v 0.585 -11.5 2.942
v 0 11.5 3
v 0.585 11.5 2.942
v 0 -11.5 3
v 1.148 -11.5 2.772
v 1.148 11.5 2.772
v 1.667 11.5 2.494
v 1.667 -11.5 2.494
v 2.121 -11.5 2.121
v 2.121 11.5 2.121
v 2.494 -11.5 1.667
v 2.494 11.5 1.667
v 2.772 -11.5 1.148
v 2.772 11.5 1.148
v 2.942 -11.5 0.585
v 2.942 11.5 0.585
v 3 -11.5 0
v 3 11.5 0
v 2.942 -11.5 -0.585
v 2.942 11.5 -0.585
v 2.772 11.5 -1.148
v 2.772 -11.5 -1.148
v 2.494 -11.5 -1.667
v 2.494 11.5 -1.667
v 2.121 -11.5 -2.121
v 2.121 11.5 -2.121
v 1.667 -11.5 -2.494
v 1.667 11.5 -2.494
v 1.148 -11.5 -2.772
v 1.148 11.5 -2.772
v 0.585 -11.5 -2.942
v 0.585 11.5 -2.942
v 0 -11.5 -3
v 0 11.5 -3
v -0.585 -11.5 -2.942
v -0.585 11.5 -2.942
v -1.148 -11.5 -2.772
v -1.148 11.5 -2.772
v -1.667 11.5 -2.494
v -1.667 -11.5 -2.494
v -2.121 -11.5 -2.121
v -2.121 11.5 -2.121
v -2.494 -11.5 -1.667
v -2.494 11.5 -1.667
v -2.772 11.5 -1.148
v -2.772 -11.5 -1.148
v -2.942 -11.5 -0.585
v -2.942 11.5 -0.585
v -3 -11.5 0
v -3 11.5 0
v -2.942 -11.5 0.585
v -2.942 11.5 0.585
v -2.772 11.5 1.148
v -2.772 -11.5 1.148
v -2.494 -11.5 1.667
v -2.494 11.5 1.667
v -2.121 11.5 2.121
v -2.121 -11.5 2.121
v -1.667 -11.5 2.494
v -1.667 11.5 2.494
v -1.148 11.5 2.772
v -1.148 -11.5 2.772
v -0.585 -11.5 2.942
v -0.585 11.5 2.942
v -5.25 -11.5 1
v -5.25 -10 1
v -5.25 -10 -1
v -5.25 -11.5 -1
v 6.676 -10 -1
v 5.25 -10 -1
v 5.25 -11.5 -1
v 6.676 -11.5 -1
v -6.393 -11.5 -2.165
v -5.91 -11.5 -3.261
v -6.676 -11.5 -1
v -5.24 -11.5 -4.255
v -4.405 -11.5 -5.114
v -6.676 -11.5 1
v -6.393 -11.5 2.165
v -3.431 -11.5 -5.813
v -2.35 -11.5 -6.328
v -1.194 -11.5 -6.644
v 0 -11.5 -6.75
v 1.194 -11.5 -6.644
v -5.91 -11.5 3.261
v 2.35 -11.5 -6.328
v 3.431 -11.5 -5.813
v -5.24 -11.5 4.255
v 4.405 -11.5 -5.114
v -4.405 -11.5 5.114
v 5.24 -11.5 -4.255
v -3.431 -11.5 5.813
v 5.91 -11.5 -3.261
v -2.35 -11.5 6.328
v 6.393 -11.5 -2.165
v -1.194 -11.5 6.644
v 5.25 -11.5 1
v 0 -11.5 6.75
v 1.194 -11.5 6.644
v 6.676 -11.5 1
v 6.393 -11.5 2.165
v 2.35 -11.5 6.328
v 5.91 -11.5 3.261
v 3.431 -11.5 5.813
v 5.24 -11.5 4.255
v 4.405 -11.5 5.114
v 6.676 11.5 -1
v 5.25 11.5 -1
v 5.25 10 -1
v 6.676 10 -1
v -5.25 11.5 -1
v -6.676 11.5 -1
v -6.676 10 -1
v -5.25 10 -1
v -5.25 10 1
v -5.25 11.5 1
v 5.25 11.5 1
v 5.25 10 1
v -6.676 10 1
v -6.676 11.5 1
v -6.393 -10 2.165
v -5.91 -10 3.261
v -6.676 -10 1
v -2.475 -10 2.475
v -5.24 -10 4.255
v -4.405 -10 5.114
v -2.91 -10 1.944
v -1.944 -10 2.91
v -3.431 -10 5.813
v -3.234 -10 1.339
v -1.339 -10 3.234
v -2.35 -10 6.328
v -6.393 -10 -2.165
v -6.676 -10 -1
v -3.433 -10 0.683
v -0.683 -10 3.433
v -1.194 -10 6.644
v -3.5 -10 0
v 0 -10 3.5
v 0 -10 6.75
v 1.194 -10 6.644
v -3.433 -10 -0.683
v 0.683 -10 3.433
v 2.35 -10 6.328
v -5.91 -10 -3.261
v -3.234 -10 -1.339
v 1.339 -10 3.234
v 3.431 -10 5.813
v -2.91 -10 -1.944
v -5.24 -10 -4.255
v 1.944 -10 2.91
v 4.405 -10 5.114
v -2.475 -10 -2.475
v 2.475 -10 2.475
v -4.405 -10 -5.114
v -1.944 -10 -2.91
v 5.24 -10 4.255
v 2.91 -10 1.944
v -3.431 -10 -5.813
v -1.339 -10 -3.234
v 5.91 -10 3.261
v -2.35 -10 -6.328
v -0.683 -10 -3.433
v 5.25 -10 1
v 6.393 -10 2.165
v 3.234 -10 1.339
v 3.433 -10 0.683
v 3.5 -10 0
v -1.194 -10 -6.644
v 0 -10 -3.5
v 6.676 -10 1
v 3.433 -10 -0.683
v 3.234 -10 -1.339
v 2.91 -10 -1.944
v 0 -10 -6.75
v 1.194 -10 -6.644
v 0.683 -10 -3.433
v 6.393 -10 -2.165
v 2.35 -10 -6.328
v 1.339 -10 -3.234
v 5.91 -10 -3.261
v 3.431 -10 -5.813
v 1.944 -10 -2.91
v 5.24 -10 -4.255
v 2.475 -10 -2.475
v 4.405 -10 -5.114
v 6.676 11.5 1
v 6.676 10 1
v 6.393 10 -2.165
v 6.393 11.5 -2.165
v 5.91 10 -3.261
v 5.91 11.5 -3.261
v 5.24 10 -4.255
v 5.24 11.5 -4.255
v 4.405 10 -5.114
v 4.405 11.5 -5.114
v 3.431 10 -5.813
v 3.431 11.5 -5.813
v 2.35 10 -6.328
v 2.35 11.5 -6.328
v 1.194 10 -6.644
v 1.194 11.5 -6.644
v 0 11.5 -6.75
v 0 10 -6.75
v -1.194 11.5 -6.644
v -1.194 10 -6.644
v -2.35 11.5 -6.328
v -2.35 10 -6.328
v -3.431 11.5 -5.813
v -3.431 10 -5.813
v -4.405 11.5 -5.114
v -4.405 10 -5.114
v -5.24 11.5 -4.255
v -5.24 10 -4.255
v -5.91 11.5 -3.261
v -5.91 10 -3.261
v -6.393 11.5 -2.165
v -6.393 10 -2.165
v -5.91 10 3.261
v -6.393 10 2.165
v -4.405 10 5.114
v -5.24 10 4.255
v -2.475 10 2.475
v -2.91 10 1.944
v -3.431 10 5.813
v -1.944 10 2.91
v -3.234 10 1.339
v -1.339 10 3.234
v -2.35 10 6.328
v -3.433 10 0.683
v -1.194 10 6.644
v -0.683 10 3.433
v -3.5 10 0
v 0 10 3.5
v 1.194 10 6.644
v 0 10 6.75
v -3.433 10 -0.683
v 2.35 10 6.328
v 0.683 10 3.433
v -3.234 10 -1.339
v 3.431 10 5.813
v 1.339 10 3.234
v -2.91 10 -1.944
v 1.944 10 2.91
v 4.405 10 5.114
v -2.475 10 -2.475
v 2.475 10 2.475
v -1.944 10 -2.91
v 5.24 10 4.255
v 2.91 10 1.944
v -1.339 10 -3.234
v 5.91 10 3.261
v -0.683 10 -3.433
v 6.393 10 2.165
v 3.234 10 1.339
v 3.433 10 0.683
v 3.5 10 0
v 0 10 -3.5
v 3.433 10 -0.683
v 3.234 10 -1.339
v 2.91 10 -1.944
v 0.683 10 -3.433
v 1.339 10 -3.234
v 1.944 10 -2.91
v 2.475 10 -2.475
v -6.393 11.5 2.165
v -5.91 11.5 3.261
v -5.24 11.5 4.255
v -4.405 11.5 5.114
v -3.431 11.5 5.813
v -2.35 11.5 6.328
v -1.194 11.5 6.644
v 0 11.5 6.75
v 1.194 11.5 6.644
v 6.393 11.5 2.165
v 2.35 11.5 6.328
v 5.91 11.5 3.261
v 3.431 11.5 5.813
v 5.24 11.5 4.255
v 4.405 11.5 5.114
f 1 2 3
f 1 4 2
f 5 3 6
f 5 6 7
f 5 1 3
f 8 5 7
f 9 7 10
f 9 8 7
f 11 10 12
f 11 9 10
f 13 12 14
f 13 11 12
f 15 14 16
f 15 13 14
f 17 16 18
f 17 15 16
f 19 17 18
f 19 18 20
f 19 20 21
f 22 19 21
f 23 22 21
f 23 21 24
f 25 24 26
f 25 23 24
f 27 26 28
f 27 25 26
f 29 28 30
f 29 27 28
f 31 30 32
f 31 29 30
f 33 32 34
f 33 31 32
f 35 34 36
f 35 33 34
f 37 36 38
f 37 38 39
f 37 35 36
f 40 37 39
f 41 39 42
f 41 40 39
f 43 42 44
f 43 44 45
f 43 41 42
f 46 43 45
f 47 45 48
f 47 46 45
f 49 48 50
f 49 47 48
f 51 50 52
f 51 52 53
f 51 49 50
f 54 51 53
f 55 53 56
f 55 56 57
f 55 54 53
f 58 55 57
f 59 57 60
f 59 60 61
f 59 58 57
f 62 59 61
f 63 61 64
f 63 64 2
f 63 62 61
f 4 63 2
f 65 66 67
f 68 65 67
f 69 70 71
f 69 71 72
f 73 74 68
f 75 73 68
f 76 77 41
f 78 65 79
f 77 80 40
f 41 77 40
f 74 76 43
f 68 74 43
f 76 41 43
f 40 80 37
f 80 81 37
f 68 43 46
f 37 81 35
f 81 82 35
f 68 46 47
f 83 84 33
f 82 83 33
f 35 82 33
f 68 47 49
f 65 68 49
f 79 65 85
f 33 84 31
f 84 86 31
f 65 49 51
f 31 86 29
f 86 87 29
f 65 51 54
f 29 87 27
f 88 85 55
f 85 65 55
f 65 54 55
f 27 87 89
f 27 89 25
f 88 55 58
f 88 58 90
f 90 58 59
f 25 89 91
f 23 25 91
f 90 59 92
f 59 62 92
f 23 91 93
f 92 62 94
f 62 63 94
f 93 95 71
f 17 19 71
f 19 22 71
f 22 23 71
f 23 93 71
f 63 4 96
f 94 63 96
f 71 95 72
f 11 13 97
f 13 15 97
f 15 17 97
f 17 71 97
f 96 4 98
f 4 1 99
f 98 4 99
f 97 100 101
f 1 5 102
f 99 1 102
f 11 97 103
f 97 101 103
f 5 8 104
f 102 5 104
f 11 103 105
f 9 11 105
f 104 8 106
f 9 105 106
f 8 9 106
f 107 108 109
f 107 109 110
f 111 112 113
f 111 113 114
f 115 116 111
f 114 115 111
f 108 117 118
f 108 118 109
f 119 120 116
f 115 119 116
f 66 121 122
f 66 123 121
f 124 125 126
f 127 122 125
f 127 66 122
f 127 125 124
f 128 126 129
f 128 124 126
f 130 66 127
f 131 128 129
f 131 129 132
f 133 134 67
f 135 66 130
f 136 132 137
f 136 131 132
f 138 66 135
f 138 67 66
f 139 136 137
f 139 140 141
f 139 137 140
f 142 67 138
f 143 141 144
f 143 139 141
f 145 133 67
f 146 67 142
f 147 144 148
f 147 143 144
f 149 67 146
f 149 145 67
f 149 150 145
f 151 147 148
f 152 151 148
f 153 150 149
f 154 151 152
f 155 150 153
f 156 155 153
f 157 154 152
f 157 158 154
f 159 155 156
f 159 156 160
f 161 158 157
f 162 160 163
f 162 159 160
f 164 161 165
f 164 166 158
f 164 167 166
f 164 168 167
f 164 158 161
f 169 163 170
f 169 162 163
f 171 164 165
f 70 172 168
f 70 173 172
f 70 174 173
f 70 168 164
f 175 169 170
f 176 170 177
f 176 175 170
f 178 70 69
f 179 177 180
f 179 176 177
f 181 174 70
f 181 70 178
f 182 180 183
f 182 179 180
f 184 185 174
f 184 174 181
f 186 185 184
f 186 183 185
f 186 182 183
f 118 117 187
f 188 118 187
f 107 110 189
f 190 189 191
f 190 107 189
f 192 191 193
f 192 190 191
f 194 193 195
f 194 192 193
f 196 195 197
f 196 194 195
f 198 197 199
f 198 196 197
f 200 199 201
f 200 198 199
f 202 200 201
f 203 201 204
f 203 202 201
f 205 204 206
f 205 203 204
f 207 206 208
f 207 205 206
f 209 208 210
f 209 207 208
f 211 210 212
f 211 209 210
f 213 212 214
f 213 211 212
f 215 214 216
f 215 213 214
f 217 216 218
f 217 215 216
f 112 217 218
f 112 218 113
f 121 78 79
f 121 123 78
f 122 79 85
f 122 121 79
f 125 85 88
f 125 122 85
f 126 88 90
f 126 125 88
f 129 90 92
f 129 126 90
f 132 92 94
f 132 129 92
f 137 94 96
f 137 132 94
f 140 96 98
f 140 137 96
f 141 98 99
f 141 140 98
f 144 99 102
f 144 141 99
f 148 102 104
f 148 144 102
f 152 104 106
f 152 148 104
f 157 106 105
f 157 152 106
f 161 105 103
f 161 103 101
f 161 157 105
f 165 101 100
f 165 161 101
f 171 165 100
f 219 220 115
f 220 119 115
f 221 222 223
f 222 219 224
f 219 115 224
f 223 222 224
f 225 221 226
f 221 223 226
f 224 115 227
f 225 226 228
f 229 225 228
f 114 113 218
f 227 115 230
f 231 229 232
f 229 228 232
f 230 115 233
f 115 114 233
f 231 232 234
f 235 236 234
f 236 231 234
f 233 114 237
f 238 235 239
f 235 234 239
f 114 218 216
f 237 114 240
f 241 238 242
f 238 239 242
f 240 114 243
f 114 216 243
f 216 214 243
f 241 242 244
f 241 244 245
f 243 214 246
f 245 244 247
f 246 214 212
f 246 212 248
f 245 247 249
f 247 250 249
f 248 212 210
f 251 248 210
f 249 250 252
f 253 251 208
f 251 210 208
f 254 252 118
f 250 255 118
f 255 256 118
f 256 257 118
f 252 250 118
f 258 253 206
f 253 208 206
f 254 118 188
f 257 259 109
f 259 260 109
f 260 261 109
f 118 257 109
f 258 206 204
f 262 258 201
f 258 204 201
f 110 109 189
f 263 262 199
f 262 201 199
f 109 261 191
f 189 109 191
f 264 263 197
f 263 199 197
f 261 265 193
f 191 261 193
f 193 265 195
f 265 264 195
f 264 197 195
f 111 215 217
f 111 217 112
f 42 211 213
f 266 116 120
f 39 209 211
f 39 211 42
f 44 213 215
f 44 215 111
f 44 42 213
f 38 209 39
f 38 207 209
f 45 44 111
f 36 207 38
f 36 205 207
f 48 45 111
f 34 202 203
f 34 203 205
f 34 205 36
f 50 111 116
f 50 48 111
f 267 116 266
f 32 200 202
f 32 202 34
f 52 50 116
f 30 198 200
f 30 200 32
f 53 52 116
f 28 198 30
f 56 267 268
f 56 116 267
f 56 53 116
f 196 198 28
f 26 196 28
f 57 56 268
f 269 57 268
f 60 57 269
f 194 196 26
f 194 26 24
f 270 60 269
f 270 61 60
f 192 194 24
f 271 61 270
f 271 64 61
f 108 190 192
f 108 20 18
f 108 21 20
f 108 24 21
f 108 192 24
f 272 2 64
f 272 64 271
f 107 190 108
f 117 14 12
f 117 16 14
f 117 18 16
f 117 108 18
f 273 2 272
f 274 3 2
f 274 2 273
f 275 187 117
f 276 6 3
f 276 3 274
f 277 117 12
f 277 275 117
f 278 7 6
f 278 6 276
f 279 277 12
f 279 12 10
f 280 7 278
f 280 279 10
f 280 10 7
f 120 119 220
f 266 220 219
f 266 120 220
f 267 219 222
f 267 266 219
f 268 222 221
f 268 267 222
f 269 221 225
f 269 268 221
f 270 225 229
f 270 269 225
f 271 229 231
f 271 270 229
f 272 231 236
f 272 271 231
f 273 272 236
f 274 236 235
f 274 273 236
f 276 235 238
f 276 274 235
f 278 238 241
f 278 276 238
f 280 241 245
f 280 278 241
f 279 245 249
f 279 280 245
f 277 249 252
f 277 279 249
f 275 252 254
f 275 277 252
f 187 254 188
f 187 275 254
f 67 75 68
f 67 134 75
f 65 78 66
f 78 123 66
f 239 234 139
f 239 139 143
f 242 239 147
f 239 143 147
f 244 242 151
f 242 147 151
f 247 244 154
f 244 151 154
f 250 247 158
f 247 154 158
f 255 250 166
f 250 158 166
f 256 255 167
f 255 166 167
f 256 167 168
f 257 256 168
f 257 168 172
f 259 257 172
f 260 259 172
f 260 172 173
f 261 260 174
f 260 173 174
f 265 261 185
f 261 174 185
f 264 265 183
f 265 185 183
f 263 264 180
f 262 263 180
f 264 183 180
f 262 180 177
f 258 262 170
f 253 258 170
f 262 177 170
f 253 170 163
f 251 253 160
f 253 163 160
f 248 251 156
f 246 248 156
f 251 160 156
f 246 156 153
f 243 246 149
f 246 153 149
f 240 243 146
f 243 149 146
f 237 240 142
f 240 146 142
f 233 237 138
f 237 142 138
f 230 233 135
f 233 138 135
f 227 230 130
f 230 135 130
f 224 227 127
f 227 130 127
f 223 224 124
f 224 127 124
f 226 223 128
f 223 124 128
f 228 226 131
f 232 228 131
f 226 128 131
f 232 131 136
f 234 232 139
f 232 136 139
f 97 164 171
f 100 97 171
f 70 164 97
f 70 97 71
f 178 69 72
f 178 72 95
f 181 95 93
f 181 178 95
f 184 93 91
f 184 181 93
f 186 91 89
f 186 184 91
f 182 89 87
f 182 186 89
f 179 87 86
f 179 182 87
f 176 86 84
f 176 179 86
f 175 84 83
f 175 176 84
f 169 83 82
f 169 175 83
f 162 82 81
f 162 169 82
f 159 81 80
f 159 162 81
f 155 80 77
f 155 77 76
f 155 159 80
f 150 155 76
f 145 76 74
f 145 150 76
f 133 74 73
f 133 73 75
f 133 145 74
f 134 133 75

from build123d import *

# Parameters (mm, degrees)
SKETCH_1_R          = 6.75
SKETCH_1_R_2        = 3
EXTRUDE_1_DEPTH     = 11.5
SKETCH_2_R          = 11.31533916
SKETCH_2_R_2        = 3.5
CUT_EXTRUDE_1_DEPTH = 10
SKETCH_4_W          = 3
SKETCH_4_H          = 2
CUT_EXTRUDE_2_DEPTH = 25.90230913


with BuildPart() as part:
    # 草图1 → 凸台-拉伸1 (new, symmetric)
    with BuildSketch(Plane(origin=(0, 0, 0), x_dir=(1, 0, 0), z_dir=(0, 1, 0))):
        with Locations(Location((0, 0, 0), (0, 0, 270))):
            Circle(SKETCH_1_R)
        with Locations(Location((0, 0, 0), (0, 0, 270))):
            Circle(SKETCH_1_R_2, mode=Mode.SUBTRACT)
    extrude(amount=EXTRUDE_1_DEPTH, both=True)

    # 草图2 → 切除-拉伸1 (cut, symmetric)
    with BuildSketch(Plane(origin=(0, 0, 0), x_dir=(1, 0, 0), z_dir=(0, 1, 0))):
        Circle(SKETCH_2_R)
        with Locations(Location((0, 0, 0), (0, 0, 270))):
            Circle(SKETCH_2_R_2, mode=Mode.SUBTRACT)
    extrude(amount=CUT_EXTRUDE_1_DEPTH, both=True, mode=Mode.SUBTRACT)

    # 草图4 → 切除-拉伸2 (cut, through all)
    with BuildSketch(Plane(origin=(0, 11.5, 0), x_dir=(1, 0, 0), z_dir=(0, 1, 0))):
        with Locations((-6.75, 0)):
            Rectangle(SKETCH_4_W, SKETCH_4_H)
        with Locations((6.75, 0)):
            Rectangle(SKETCH_4_W, SKETCH_4_H)
    extrude(amount=-CUT_EXTRUDE_2_DEPTH, mode=Mode.SUBTRACT)


solid = part.part
